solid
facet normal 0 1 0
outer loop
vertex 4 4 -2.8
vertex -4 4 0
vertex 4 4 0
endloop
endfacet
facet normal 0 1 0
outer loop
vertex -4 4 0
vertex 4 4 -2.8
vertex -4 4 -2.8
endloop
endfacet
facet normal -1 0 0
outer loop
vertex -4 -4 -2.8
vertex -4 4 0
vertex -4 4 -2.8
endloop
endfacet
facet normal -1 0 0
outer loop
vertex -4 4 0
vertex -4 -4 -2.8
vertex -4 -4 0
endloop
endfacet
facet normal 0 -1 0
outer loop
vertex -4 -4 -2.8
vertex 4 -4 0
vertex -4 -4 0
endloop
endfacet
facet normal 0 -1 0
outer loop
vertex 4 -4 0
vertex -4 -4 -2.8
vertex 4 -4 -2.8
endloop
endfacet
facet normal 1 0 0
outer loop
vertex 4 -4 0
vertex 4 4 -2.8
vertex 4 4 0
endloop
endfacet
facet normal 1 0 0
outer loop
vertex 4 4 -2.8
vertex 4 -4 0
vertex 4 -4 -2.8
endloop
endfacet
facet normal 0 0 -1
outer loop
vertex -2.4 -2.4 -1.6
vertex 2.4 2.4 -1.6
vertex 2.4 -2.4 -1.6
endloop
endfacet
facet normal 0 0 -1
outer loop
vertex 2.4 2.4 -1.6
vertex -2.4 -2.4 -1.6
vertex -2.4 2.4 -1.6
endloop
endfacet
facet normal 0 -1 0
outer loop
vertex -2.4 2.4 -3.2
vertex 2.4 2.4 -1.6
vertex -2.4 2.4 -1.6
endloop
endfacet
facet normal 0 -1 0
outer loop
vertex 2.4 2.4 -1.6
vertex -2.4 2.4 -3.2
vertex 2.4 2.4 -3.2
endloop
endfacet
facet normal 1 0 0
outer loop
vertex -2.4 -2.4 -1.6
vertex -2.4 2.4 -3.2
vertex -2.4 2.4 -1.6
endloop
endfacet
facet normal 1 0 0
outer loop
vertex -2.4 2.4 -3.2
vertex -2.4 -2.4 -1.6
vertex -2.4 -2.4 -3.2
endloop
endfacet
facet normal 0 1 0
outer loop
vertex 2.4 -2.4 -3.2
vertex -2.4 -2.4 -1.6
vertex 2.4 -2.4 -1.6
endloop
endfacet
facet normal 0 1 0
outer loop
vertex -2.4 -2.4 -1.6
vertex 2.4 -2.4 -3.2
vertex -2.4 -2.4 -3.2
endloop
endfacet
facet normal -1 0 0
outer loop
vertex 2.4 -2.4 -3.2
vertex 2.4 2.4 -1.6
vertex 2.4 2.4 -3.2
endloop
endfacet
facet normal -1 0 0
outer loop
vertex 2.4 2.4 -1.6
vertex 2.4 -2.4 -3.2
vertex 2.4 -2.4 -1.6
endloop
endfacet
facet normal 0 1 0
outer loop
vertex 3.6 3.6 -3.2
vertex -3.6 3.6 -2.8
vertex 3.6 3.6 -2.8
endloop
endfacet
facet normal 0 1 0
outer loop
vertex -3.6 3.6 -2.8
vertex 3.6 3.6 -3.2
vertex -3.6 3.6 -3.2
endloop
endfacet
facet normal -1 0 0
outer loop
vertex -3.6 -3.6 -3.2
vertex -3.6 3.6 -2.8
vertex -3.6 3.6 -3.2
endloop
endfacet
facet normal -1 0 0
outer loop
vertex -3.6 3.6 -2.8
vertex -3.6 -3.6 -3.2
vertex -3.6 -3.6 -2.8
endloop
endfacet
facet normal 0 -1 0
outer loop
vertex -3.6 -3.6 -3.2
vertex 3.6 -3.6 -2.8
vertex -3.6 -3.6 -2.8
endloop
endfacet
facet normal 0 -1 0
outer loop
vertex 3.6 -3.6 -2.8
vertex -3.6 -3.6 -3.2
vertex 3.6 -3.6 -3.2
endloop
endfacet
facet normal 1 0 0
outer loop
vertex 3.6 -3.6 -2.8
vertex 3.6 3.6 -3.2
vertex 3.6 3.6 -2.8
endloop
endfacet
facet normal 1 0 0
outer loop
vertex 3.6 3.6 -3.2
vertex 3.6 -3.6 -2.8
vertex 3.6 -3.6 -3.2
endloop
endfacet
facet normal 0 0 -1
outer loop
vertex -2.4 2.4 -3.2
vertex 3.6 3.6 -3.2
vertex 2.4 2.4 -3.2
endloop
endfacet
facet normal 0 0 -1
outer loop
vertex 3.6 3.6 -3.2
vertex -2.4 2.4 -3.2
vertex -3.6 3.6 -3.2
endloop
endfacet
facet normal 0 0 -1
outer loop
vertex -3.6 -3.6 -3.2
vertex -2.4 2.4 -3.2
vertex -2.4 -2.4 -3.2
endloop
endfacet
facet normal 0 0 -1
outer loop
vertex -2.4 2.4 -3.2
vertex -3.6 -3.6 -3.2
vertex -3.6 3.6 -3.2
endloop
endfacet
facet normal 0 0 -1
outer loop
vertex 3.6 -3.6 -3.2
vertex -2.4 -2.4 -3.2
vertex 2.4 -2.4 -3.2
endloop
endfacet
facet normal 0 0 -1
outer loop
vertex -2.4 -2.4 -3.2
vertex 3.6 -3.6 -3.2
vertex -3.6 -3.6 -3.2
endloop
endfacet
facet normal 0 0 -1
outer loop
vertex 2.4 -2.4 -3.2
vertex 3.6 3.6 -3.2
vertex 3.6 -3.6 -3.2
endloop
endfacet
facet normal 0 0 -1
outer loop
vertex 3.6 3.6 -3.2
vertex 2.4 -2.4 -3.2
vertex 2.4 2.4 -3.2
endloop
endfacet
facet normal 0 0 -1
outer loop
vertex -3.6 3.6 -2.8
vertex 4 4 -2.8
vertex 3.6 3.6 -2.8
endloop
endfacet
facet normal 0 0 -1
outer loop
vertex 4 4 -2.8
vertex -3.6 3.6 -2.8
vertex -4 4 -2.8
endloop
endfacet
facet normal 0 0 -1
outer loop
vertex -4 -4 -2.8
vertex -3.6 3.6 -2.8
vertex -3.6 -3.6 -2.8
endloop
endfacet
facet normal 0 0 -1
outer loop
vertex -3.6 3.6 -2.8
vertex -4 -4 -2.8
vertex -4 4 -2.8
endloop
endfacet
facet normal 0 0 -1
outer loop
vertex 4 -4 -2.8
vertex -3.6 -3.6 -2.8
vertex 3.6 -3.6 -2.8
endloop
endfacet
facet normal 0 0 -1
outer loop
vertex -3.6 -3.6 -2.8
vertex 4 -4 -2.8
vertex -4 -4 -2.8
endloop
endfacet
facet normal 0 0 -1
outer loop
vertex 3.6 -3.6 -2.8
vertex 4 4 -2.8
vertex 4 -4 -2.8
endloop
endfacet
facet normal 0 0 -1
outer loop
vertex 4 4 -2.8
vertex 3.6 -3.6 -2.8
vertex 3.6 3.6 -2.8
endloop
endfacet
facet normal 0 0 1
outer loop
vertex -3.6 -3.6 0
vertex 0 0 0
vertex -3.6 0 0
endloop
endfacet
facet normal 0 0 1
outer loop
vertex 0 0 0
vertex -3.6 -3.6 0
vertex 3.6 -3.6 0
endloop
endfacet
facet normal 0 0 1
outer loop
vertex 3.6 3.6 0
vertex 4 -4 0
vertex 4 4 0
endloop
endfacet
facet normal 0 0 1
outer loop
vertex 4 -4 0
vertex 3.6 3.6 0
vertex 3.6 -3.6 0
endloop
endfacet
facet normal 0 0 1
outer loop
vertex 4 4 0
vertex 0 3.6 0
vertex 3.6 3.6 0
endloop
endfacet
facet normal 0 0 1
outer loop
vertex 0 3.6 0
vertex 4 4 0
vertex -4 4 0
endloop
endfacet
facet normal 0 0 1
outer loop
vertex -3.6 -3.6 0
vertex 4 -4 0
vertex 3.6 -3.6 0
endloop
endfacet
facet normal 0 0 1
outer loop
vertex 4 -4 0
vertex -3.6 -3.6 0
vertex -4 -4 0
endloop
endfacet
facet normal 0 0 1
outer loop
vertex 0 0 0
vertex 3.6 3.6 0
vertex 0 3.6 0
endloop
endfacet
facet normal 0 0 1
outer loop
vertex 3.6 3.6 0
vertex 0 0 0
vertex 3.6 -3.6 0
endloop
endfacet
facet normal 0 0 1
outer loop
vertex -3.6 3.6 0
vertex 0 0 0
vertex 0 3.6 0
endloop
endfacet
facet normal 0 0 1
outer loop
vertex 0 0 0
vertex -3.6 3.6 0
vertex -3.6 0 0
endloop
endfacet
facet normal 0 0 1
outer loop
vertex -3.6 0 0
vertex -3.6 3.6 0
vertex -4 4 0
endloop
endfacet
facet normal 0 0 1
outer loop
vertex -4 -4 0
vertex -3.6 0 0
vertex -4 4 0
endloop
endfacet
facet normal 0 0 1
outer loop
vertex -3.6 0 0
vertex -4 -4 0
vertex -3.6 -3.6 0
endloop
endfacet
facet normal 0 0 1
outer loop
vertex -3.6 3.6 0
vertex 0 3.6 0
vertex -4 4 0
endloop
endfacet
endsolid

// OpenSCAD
// file: ../p/box5.scad
use <../lib.scad>
function ldraw_lib__box5() = [
// 0 Box with 5 Faces and All Edges
// 0 Name: box5.dat
// 0 Author: James Jessiman
// 0 !LDRAW_ORG Primitive UPDATE 2012-01
// 0 !LICENSE Licensed under CC BY 4.0 : see CAreadme.txt
// 
// 0 BFC CERTIFY CCW
  [0,"BFC","CERTIFY"],
  [0,"BFC","CCW"],
// 
// 0 !HISTORY 2002-04-03 [sbliss] Modified for BFC compliance
// 0 !HISTORY 2002-04-25 [PTadmin] Official Update 2002-02
// 0 !HISTORY 2007-06-24 [PTadmin] Header formatted for Contributor Agreement
// 0 !HISTORY 2008-07-01 [PTadmin] Official Update 2008-01
// 0 !HISTORY 2012-02-16 [Philo] Changed to CCW
// 0 !HISTORY 2012-03-30 [PTadmin] Official Update 2012-01
// 
// 
// 2 24 1 1 1 -1 1 1
  [2,24,1,1,1,-1,1,1],
// 2 24 -1 1 1 -1 1 -1
  [2,24,-1,1,1,-1,1,-1],
// 2 24 -1 1 -1 1 1 -1
  [2,24,-1,1,-1,1,1,-1],
// 2 24 1 1 -1 1 1 1
  [2,24,1,1,-1,1,1,1],
// 2 24 1 0 1 -1 0 1
  [2,24,1,0,1,-1,0,1],
// 2 24 -1 0 1 -1 0 -1
  [2,24,-1,0,1,-1,0,-1],
// 2 24 -1 0 -1 1 0 -1
  [2,24,-1,0,-1,1,0,-1],
// 2 24 1 0 -1 1 0 1
  [2,24,1,0,-1,1,0,1],
// 2 24 1 0 1 1 1 1
  [2,24,1,0,1,1,1,1],
// 2 24 -1 0 1 -1 1 1
  [2,24,-1,0,1,-1,1,1],
// 2 24 1 0 -1 1 1 -1
  [2,24,1,0,-1,1,1,-1],
// 2 24 -1 0 -1 -1 1 -1
  [2,24,-1,0,-1,-1,1,-1],
// 4 16 -1 1 1 1 1 1 1 1 -1 -1 1 -1
  [4,16,-1,1,1,1,1,1,1,1,-1,-1,1,-1],
// 4 16 -1 1 1 -1 0 1 1 0 1 1 1 1
  [4,16,-1,1,1,-1,0,1,1,0,1,1,1,1],
// 4 16 -1 1 -1 -1 0 -1 -1 0 1 -1 1 1
  [4,16,-1,1,-1,-1,0,-1,-1,0,1,-1,1,1],
// 4 16 1 1 -1 1 0 -1 -1 0 -1 -1 1 -1
  [4,16,1,1,-1,1,0,-1,-1,0,-1,-1,1,-1],
// 4 16 1 1 1 1 0 1 1 0 -1 1 1 -1
  [4,16,1,1,1,1,0,1,1,0,-1,1,1,-1],
];
module ldraw_lib__box5(step=0, col=false, unit=2/5, alt=false, line=0.2, solid=!$preview)
    makepoly(ldraw_lib__box5(), step=step, col=col, unit=unit, alt=alt, line=line, solid=solid);
ldraw_lib__box5(line=0.2);
// file: ../p/box4.scad
use <../lib.scad>
function ldraw_lib__box4() = [
// 0 Box with 4 Faces (2 Parallel Pairs) and All Edges
// 0 Name: box4.dat
// 0 Author: James Jessiman
// 0 !LDRAW_ORG Primitive UPDATE 2012-01
// 0 !LICENSE Licensed under CC BY 4.0 : see CAreadme.txt
// 
// 0 BFC CERTIFY CCW
  [0,"BFC","CERTIFY"],
  [0,"BFC","CCW"],
// 
// 0 !HISTORY 2002-04-03 [sbliss] Modified for BFC compliance
// 0 !HISTORY 2002-04-25 [PTadmin] Official Update 2002-02
// 0 !HISTORY 2007-06-24 [PTadmin] Header formatted for Contributor Agreement
// 0 !HISTORY 2008-07-01 [PTadmin] Official Update 2008-01
// 0 !HISTORY 2012-02-16 [Philo] Changed to CCW
// 0 !HISTORY 2012-03-30 [PTadmin] Official Update 2012-01
// 
// 
// 2 24 1 1 1 -1 1 1
  [2,24,1,1,1,-1,1,1],
// 2 24 -1 1 1 -1 1 -1
  [2,24,-1,1,1,-1,1,-1],
// 2 24 -1 1 -1 1 1 -1
  [2,24,-1,1,-1,1,1,-1],
// 2 24 1 1 -1 1 1 1
  [2,24,1,1,-1,1,1,1],
// 2 24 1 0 1 -1 0 1
  [2,24,1,0,1,-1,0,1],
// 2 24 -1 0 1 -1 0 -1
  [2,24,-1,0,1,-1,0,-1],
// 2 24 -1 0 -1 1 0 -1
  [2,24,-1,0,-1,1,0,-1],
// 2 24 1 0 -1 1 0 1
  [2,24,1,0,-1,1,0,1],
// 2 24 1 0 1 1 1 1
  [2,24,1,0,1,1,1,1],
// 2 24 -1 0 1 -1 1 1
  [2,24,-1,0,1,-1,1,1],
// 2 24 1 0 -1 1 1 -1
  [2,24,1,0,-1,1,1,-1],
// 2 24 -1 0 -1 -1 1 -1
  [2,24,-1,0,-1,-1,1,-1],
// 4 16 -1 1 1 -1 0 1 1 0 1 1 1 1
  [4,16,-1,1,1,-1,0,1,1,0,1,1,1,1],
// 4 16 -1 1 -1 -1 0 -1 -1 0 1 -1 1 1
  [4,16,-1,1,-1,-1,0,-1,-1,0,1,-1,1,1],
// 4 16 1 1 -1 1 0 -1 -1 0 -1 -1 1 -1
  [4,16,1,1,-1,1,0,-1,-1,0,-1,-1,1,-1],
// 4 16 1 1 1 1 0 1 1 0 -1 1 1 -1
  [4,16,1,1,1,1,0,1,1,0,-1,1,1,-1],
];
module ldraw_lib__box4(step=0, col=false, unit=2/5, alt=false, line=0.2, solid=!$preview)
    makepoly(ldraw_lib__box4(), step=step, col=col, unit=unit, alt=alt, line=line, solid=solid);
ldraw_lib__box4(line=0.2);
// file: s/3070bs01.scad
use <../../lib.scad>
use <../../p/box4.scad>
use <../../p/box5.scad>
function ldraw_lib__s__3070bs01() = [
// 0 ~Tile  1 x  1 with Groove without Top Face
// 0 Name: s\3070bs01.dat
// 0 Author: Chris Dee [cwdee]
// 0 !LDRAW_ORG Subpart UPDATE 2009-02
// 0 !LICENSE Licensed under CC BY 4.0 : see CAreadme.txt
// 
// 0 BFC CERTIFY CCW
  [0,"BFC","CERTIFY"],
  [0,"BFC","CCW"],
// 
// 0 !HISTORY 2009-09-03 [PTadmin] Official Update 2009-02
// 
// 
// 1 16 0 0 0 10 0 0 0 7 0 0 0 10 box4.dat
  [1,16,0,0,0,10,0,0,0,7,0,0,0,10, ldraw_lib__box4()],
// 0 BFC INVERTNEXT
  [0,"BFC","INVERTNEXT"],
// 1 16 0 8 0 6 0 0 0 -4 0 0 0 6 box5.dat
  [1,16,0,8,0,6,0,0,0,-4,0,0,0,6, ldraw_lib__box5()],
// 1 16 0 7 0 9 0 0 0 1 0 0 0 9 box4.dat
  [1,16,0,7,0,9,0,0,0,1,0,0,0,9, ldraw_lib__box4()],
// 
// 4 16 9 8 9 6 8 6 -6 8 6 -9 8 9
  [4,16,9,8,9,6,8,6,-6,8,6,-9,8,9],
// 4 16 -9 8 9 -6 8 6 -6 8 -6 -9 8 -9
  [4,16,-9,8,9,-6,8,6,-6,8,-6,-9,8,-9],
// 4 16 -9 8 -9 -6 8 -6 6 8 -6 9 8 -9
  [4,16,-9,8,-9,-6,8,-6,6,8,-6,9,8,-9],
// 4 16 9 8 -9 6 8 -6 6 8 6 9 8 9
  [4,16,9,8,-9,6,8,-6,6,8,6,9,8,9],
// 
// 4 16 10 7 10 9 7 9 -9 7 9 -10 7 10
  [4,16,10,7,10,9,7,9,-9,7,9,-10,7,10],
// 4 16 -10 7 10 -9 7 9 -9 7 -9 -10 7 -10
  [4,16,-10,7,10,-9,7,9,-9,7,-9,-10,7,-10],
// 4 16 -10 7 -10 -9 7 -9 9 7 -9 10 7 -10
  [4,16,-10,7,-10,-9,7,-9,9,7,-9,10,7,-10],
// 4 16 10 7 -10 9 7 -9 9 7 9 10 7 10
  [4,16,10,7,-10,9,7,-9,9,7,9,10,7,10],
// 0
];
module ldraw_lib__s__3070bs01(step=0, col=false, unit=2/5, alt=false, line=0.2, solid=!$preview)
    makepoly(ldraw_lib__s__3070bs01(), step=step, col=col, unit=unit, alt=alt, line=line, solid=solid);
ldraw_lib__s__3070bs01(line=0.2);
// main file
use <../lib.scad>
use <s/3070bs01.scad>
function ldraw_lib__3070bp0y() = [
// 0 Tile  1 x  1 with Blue, Bright Pink and Yellow Polygons Pattern
// 0 Name: 3070bp0y.dat
// 0 Author: Philippe Hurbain [Philo]
// 0 !LDRAW_ORG Part UPDATE 2020-03
// 0 !LICENSE Licensed under CC BY 4.0 : see CAreadme.txt
// 
// 0 BFC CERTIFY CCW
  [0,"BFC","CERTIFY"],
  [0,"BFC","CCW"],
// 
// 0 !KEYWORDS Bricklink 3070bpb153, Dots, Set 41916
// 
// 0 !HISTORY 2020-12-29 [PTadmin] Official Update 2020-03
// 
// 
// 1 16 0 0 0 1 0 0 0 1 0 0 0 1 s\3070bs01.dat
  [1,16,0,0,0,1,0,0,0,1,0,0,0,1, ldraw_lib__s__3070bs01()],
// 4 29 -9 0 -9 9 0 -9 0 0 0 -9 0 0
  [4,29,-9,0,-9,9,0,-9,0,0,0,-9,0,0],
// 4 16 9 0 -9 10 0 -10 10 0 10 9 0 9
  [4,16,9,0,-9,10,0,-10,10,0,10,9,0,9],
// 4 16 0 0 9 9 0 9 10 0 10 -10 0 10
  [4,16,0,0,9,9,0,9,10,0,10,-10,0,10],
// 4 16 10 0 -10 9 0 -9 -9 0 -9 -10 0 -10
  [4,16,10,0,-10,9,0,-9,-9,0,-9,-10,0,-10],
// 4 1 9 0 9 0 0 9 0 0 0 9 0 -9
  [4,1,9,0,9,0,0,9,0,0,0,9,0,-9],
// 4 14 -9 0 9 -9 0 0 0 0 0 0 0 9
  [4,14,-9,0,9,-9,0,0,0,0,0,0,0,9],
// 3 16 -9 0 0 -9 0 9 -10 0 10
  [3,16,-9,0,0,-9,0,9,-10,0,10],
// 4 16 -9 0 0 -10 0 10 -10 0 -10 -9 0 -9
  [4,16,-9,0,0,-10,0,10,-10,0,-10,-9,0,-9],
// 3 16 -9 0 9 0 0 9 -10 0 10
  [3,16,-9,0,9,0,0,9,-10,0,10],
];
module ldraw_lib__3070bp0y(step=0, col=false, unit=2/5, alt=false, line=0.2, solid=!$preview)
    makepoly(ldraw_lib__3070bp0y(), step=step, col=col, unit=unit, alt=alt, line=line, solid=solid);
ldraw_lib__3070bp0y(line=0.2);
